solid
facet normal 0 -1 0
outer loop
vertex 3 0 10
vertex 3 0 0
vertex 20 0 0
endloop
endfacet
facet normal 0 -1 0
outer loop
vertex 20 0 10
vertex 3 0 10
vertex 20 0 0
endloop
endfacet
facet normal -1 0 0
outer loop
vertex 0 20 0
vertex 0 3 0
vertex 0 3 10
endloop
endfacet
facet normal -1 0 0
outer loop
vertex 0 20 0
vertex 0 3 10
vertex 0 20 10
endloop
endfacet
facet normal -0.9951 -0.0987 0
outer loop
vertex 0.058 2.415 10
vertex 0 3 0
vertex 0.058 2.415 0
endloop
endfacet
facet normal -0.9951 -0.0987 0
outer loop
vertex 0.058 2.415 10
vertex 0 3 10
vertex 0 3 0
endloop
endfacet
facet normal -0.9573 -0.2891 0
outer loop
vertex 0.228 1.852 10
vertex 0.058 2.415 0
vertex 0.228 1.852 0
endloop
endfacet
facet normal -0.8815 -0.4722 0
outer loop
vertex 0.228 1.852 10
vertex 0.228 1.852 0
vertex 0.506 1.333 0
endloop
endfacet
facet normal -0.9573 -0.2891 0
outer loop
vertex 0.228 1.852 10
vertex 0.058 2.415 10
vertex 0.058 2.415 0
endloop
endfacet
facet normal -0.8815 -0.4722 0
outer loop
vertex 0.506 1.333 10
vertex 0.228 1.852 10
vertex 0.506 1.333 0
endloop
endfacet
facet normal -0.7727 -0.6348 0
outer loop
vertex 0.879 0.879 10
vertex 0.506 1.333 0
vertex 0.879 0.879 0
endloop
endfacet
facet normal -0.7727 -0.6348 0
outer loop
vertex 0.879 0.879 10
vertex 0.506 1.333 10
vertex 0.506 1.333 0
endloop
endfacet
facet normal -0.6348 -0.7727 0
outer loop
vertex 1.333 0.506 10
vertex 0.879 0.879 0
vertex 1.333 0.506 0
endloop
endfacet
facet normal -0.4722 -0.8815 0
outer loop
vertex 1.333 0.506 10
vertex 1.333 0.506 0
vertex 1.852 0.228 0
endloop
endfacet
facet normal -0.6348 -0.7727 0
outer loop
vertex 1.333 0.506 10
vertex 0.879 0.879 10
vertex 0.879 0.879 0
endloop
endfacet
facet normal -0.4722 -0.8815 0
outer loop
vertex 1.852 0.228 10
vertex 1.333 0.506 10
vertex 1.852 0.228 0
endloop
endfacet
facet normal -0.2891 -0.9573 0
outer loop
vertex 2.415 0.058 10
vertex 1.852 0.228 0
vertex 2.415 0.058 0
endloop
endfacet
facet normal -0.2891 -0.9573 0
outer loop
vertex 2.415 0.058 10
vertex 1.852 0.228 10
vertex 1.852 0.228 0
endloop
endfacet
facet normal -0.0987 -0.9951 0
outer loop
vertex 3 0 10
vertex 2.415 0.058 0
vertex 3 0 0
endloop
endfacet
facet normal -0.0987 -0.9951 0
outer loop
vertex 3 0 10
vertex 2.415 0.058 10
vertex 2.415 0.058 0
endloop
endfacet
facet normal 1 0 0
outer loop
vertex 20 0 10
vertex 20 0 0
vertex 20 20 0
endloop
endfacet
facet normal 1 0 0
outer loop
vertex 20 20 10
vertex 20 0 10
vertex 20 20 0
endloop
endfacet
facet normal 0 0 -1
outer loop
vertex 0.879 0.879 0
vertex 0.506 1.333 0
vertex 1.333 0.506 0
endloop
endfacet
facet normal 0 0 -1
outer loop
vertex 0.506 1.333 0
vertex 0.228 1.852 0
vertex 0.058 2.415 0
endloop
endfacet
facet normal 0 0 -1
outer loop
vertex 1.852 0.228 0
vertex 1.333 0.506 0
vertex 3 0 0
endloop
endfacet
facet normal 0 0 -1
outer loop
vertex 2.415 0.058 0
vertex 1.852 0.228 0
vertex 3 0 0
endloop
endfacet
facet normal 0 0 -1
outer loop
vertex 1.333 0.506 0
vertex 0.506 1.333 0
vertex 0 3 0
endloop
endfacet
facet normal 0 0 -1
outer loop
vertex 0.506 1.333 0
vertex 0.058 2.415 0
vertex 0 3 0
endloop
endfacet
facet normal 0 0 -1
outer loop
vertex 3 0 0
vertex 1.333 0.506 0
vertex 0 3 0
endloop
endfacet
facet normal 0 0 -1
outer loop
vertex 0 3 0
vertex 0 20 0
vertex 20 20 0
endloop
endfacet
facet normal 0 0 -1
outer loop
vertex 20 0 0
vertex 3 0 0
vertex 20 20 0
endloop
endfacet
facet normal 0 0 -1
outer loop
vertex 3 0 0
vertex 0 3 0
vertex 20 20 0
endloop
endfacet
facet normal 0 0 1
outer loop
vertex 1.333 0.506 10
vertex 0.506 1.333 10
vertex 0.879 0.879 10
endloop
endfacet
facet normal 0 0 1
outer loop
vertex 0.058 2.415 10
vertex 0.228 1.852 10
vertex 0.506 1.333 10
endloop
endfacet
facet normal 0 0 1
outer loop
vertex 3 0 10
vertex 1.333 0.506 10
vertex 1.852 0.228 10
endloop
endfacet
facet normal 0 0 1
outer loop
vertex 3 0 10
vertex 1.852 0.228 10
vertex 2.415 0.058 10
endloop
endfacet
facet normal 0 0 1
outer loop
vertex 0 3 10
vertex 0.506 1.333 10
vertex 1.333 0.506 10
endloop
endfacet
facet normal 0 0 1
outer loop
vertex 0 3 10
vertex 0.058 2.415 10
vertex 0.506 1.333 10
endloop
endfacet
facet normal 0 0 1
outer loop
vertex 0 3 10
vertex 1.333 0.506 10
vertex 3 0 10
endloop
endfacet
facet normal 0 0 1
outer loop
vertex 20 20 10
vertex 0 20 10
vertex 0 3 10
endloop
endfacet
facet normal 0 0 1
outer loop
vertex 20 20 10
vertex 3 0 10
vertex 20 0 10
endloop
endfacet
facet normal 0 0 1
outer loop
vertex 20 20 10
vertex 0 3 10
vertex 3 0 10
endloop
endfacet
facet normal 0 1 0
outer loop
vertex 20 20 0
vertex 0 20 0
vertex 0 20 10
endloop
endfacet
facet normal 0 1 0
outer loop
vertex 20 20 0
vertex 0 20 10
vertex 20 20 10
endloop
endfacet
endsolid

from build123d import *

# Parameters (mm, degrees)
SKETCH_1_W    = 20
SKETCH_1_H    = 20
BASEBOX_DEPTH = 10
FACEFILLET_R  = 3


with BuildPart() as part:
    # 草图1 → BaseBox (new body)
    with BuildSketch(Plane.XY):
        with Locations((10, 10)):
            Rectangle(SKETCH_1_W, SKETCH_1_H)
    extrude(amount=BASEBOX_DEPTH)

    # FaceFillet
    facefillet_edges = [part.edges().sort_by_distance(p)[0] for p in [
        (0, 0, 5),
    ]]
    fillet(facefillet_edges, radius=FACEFILLET_R)


solid = part.part
